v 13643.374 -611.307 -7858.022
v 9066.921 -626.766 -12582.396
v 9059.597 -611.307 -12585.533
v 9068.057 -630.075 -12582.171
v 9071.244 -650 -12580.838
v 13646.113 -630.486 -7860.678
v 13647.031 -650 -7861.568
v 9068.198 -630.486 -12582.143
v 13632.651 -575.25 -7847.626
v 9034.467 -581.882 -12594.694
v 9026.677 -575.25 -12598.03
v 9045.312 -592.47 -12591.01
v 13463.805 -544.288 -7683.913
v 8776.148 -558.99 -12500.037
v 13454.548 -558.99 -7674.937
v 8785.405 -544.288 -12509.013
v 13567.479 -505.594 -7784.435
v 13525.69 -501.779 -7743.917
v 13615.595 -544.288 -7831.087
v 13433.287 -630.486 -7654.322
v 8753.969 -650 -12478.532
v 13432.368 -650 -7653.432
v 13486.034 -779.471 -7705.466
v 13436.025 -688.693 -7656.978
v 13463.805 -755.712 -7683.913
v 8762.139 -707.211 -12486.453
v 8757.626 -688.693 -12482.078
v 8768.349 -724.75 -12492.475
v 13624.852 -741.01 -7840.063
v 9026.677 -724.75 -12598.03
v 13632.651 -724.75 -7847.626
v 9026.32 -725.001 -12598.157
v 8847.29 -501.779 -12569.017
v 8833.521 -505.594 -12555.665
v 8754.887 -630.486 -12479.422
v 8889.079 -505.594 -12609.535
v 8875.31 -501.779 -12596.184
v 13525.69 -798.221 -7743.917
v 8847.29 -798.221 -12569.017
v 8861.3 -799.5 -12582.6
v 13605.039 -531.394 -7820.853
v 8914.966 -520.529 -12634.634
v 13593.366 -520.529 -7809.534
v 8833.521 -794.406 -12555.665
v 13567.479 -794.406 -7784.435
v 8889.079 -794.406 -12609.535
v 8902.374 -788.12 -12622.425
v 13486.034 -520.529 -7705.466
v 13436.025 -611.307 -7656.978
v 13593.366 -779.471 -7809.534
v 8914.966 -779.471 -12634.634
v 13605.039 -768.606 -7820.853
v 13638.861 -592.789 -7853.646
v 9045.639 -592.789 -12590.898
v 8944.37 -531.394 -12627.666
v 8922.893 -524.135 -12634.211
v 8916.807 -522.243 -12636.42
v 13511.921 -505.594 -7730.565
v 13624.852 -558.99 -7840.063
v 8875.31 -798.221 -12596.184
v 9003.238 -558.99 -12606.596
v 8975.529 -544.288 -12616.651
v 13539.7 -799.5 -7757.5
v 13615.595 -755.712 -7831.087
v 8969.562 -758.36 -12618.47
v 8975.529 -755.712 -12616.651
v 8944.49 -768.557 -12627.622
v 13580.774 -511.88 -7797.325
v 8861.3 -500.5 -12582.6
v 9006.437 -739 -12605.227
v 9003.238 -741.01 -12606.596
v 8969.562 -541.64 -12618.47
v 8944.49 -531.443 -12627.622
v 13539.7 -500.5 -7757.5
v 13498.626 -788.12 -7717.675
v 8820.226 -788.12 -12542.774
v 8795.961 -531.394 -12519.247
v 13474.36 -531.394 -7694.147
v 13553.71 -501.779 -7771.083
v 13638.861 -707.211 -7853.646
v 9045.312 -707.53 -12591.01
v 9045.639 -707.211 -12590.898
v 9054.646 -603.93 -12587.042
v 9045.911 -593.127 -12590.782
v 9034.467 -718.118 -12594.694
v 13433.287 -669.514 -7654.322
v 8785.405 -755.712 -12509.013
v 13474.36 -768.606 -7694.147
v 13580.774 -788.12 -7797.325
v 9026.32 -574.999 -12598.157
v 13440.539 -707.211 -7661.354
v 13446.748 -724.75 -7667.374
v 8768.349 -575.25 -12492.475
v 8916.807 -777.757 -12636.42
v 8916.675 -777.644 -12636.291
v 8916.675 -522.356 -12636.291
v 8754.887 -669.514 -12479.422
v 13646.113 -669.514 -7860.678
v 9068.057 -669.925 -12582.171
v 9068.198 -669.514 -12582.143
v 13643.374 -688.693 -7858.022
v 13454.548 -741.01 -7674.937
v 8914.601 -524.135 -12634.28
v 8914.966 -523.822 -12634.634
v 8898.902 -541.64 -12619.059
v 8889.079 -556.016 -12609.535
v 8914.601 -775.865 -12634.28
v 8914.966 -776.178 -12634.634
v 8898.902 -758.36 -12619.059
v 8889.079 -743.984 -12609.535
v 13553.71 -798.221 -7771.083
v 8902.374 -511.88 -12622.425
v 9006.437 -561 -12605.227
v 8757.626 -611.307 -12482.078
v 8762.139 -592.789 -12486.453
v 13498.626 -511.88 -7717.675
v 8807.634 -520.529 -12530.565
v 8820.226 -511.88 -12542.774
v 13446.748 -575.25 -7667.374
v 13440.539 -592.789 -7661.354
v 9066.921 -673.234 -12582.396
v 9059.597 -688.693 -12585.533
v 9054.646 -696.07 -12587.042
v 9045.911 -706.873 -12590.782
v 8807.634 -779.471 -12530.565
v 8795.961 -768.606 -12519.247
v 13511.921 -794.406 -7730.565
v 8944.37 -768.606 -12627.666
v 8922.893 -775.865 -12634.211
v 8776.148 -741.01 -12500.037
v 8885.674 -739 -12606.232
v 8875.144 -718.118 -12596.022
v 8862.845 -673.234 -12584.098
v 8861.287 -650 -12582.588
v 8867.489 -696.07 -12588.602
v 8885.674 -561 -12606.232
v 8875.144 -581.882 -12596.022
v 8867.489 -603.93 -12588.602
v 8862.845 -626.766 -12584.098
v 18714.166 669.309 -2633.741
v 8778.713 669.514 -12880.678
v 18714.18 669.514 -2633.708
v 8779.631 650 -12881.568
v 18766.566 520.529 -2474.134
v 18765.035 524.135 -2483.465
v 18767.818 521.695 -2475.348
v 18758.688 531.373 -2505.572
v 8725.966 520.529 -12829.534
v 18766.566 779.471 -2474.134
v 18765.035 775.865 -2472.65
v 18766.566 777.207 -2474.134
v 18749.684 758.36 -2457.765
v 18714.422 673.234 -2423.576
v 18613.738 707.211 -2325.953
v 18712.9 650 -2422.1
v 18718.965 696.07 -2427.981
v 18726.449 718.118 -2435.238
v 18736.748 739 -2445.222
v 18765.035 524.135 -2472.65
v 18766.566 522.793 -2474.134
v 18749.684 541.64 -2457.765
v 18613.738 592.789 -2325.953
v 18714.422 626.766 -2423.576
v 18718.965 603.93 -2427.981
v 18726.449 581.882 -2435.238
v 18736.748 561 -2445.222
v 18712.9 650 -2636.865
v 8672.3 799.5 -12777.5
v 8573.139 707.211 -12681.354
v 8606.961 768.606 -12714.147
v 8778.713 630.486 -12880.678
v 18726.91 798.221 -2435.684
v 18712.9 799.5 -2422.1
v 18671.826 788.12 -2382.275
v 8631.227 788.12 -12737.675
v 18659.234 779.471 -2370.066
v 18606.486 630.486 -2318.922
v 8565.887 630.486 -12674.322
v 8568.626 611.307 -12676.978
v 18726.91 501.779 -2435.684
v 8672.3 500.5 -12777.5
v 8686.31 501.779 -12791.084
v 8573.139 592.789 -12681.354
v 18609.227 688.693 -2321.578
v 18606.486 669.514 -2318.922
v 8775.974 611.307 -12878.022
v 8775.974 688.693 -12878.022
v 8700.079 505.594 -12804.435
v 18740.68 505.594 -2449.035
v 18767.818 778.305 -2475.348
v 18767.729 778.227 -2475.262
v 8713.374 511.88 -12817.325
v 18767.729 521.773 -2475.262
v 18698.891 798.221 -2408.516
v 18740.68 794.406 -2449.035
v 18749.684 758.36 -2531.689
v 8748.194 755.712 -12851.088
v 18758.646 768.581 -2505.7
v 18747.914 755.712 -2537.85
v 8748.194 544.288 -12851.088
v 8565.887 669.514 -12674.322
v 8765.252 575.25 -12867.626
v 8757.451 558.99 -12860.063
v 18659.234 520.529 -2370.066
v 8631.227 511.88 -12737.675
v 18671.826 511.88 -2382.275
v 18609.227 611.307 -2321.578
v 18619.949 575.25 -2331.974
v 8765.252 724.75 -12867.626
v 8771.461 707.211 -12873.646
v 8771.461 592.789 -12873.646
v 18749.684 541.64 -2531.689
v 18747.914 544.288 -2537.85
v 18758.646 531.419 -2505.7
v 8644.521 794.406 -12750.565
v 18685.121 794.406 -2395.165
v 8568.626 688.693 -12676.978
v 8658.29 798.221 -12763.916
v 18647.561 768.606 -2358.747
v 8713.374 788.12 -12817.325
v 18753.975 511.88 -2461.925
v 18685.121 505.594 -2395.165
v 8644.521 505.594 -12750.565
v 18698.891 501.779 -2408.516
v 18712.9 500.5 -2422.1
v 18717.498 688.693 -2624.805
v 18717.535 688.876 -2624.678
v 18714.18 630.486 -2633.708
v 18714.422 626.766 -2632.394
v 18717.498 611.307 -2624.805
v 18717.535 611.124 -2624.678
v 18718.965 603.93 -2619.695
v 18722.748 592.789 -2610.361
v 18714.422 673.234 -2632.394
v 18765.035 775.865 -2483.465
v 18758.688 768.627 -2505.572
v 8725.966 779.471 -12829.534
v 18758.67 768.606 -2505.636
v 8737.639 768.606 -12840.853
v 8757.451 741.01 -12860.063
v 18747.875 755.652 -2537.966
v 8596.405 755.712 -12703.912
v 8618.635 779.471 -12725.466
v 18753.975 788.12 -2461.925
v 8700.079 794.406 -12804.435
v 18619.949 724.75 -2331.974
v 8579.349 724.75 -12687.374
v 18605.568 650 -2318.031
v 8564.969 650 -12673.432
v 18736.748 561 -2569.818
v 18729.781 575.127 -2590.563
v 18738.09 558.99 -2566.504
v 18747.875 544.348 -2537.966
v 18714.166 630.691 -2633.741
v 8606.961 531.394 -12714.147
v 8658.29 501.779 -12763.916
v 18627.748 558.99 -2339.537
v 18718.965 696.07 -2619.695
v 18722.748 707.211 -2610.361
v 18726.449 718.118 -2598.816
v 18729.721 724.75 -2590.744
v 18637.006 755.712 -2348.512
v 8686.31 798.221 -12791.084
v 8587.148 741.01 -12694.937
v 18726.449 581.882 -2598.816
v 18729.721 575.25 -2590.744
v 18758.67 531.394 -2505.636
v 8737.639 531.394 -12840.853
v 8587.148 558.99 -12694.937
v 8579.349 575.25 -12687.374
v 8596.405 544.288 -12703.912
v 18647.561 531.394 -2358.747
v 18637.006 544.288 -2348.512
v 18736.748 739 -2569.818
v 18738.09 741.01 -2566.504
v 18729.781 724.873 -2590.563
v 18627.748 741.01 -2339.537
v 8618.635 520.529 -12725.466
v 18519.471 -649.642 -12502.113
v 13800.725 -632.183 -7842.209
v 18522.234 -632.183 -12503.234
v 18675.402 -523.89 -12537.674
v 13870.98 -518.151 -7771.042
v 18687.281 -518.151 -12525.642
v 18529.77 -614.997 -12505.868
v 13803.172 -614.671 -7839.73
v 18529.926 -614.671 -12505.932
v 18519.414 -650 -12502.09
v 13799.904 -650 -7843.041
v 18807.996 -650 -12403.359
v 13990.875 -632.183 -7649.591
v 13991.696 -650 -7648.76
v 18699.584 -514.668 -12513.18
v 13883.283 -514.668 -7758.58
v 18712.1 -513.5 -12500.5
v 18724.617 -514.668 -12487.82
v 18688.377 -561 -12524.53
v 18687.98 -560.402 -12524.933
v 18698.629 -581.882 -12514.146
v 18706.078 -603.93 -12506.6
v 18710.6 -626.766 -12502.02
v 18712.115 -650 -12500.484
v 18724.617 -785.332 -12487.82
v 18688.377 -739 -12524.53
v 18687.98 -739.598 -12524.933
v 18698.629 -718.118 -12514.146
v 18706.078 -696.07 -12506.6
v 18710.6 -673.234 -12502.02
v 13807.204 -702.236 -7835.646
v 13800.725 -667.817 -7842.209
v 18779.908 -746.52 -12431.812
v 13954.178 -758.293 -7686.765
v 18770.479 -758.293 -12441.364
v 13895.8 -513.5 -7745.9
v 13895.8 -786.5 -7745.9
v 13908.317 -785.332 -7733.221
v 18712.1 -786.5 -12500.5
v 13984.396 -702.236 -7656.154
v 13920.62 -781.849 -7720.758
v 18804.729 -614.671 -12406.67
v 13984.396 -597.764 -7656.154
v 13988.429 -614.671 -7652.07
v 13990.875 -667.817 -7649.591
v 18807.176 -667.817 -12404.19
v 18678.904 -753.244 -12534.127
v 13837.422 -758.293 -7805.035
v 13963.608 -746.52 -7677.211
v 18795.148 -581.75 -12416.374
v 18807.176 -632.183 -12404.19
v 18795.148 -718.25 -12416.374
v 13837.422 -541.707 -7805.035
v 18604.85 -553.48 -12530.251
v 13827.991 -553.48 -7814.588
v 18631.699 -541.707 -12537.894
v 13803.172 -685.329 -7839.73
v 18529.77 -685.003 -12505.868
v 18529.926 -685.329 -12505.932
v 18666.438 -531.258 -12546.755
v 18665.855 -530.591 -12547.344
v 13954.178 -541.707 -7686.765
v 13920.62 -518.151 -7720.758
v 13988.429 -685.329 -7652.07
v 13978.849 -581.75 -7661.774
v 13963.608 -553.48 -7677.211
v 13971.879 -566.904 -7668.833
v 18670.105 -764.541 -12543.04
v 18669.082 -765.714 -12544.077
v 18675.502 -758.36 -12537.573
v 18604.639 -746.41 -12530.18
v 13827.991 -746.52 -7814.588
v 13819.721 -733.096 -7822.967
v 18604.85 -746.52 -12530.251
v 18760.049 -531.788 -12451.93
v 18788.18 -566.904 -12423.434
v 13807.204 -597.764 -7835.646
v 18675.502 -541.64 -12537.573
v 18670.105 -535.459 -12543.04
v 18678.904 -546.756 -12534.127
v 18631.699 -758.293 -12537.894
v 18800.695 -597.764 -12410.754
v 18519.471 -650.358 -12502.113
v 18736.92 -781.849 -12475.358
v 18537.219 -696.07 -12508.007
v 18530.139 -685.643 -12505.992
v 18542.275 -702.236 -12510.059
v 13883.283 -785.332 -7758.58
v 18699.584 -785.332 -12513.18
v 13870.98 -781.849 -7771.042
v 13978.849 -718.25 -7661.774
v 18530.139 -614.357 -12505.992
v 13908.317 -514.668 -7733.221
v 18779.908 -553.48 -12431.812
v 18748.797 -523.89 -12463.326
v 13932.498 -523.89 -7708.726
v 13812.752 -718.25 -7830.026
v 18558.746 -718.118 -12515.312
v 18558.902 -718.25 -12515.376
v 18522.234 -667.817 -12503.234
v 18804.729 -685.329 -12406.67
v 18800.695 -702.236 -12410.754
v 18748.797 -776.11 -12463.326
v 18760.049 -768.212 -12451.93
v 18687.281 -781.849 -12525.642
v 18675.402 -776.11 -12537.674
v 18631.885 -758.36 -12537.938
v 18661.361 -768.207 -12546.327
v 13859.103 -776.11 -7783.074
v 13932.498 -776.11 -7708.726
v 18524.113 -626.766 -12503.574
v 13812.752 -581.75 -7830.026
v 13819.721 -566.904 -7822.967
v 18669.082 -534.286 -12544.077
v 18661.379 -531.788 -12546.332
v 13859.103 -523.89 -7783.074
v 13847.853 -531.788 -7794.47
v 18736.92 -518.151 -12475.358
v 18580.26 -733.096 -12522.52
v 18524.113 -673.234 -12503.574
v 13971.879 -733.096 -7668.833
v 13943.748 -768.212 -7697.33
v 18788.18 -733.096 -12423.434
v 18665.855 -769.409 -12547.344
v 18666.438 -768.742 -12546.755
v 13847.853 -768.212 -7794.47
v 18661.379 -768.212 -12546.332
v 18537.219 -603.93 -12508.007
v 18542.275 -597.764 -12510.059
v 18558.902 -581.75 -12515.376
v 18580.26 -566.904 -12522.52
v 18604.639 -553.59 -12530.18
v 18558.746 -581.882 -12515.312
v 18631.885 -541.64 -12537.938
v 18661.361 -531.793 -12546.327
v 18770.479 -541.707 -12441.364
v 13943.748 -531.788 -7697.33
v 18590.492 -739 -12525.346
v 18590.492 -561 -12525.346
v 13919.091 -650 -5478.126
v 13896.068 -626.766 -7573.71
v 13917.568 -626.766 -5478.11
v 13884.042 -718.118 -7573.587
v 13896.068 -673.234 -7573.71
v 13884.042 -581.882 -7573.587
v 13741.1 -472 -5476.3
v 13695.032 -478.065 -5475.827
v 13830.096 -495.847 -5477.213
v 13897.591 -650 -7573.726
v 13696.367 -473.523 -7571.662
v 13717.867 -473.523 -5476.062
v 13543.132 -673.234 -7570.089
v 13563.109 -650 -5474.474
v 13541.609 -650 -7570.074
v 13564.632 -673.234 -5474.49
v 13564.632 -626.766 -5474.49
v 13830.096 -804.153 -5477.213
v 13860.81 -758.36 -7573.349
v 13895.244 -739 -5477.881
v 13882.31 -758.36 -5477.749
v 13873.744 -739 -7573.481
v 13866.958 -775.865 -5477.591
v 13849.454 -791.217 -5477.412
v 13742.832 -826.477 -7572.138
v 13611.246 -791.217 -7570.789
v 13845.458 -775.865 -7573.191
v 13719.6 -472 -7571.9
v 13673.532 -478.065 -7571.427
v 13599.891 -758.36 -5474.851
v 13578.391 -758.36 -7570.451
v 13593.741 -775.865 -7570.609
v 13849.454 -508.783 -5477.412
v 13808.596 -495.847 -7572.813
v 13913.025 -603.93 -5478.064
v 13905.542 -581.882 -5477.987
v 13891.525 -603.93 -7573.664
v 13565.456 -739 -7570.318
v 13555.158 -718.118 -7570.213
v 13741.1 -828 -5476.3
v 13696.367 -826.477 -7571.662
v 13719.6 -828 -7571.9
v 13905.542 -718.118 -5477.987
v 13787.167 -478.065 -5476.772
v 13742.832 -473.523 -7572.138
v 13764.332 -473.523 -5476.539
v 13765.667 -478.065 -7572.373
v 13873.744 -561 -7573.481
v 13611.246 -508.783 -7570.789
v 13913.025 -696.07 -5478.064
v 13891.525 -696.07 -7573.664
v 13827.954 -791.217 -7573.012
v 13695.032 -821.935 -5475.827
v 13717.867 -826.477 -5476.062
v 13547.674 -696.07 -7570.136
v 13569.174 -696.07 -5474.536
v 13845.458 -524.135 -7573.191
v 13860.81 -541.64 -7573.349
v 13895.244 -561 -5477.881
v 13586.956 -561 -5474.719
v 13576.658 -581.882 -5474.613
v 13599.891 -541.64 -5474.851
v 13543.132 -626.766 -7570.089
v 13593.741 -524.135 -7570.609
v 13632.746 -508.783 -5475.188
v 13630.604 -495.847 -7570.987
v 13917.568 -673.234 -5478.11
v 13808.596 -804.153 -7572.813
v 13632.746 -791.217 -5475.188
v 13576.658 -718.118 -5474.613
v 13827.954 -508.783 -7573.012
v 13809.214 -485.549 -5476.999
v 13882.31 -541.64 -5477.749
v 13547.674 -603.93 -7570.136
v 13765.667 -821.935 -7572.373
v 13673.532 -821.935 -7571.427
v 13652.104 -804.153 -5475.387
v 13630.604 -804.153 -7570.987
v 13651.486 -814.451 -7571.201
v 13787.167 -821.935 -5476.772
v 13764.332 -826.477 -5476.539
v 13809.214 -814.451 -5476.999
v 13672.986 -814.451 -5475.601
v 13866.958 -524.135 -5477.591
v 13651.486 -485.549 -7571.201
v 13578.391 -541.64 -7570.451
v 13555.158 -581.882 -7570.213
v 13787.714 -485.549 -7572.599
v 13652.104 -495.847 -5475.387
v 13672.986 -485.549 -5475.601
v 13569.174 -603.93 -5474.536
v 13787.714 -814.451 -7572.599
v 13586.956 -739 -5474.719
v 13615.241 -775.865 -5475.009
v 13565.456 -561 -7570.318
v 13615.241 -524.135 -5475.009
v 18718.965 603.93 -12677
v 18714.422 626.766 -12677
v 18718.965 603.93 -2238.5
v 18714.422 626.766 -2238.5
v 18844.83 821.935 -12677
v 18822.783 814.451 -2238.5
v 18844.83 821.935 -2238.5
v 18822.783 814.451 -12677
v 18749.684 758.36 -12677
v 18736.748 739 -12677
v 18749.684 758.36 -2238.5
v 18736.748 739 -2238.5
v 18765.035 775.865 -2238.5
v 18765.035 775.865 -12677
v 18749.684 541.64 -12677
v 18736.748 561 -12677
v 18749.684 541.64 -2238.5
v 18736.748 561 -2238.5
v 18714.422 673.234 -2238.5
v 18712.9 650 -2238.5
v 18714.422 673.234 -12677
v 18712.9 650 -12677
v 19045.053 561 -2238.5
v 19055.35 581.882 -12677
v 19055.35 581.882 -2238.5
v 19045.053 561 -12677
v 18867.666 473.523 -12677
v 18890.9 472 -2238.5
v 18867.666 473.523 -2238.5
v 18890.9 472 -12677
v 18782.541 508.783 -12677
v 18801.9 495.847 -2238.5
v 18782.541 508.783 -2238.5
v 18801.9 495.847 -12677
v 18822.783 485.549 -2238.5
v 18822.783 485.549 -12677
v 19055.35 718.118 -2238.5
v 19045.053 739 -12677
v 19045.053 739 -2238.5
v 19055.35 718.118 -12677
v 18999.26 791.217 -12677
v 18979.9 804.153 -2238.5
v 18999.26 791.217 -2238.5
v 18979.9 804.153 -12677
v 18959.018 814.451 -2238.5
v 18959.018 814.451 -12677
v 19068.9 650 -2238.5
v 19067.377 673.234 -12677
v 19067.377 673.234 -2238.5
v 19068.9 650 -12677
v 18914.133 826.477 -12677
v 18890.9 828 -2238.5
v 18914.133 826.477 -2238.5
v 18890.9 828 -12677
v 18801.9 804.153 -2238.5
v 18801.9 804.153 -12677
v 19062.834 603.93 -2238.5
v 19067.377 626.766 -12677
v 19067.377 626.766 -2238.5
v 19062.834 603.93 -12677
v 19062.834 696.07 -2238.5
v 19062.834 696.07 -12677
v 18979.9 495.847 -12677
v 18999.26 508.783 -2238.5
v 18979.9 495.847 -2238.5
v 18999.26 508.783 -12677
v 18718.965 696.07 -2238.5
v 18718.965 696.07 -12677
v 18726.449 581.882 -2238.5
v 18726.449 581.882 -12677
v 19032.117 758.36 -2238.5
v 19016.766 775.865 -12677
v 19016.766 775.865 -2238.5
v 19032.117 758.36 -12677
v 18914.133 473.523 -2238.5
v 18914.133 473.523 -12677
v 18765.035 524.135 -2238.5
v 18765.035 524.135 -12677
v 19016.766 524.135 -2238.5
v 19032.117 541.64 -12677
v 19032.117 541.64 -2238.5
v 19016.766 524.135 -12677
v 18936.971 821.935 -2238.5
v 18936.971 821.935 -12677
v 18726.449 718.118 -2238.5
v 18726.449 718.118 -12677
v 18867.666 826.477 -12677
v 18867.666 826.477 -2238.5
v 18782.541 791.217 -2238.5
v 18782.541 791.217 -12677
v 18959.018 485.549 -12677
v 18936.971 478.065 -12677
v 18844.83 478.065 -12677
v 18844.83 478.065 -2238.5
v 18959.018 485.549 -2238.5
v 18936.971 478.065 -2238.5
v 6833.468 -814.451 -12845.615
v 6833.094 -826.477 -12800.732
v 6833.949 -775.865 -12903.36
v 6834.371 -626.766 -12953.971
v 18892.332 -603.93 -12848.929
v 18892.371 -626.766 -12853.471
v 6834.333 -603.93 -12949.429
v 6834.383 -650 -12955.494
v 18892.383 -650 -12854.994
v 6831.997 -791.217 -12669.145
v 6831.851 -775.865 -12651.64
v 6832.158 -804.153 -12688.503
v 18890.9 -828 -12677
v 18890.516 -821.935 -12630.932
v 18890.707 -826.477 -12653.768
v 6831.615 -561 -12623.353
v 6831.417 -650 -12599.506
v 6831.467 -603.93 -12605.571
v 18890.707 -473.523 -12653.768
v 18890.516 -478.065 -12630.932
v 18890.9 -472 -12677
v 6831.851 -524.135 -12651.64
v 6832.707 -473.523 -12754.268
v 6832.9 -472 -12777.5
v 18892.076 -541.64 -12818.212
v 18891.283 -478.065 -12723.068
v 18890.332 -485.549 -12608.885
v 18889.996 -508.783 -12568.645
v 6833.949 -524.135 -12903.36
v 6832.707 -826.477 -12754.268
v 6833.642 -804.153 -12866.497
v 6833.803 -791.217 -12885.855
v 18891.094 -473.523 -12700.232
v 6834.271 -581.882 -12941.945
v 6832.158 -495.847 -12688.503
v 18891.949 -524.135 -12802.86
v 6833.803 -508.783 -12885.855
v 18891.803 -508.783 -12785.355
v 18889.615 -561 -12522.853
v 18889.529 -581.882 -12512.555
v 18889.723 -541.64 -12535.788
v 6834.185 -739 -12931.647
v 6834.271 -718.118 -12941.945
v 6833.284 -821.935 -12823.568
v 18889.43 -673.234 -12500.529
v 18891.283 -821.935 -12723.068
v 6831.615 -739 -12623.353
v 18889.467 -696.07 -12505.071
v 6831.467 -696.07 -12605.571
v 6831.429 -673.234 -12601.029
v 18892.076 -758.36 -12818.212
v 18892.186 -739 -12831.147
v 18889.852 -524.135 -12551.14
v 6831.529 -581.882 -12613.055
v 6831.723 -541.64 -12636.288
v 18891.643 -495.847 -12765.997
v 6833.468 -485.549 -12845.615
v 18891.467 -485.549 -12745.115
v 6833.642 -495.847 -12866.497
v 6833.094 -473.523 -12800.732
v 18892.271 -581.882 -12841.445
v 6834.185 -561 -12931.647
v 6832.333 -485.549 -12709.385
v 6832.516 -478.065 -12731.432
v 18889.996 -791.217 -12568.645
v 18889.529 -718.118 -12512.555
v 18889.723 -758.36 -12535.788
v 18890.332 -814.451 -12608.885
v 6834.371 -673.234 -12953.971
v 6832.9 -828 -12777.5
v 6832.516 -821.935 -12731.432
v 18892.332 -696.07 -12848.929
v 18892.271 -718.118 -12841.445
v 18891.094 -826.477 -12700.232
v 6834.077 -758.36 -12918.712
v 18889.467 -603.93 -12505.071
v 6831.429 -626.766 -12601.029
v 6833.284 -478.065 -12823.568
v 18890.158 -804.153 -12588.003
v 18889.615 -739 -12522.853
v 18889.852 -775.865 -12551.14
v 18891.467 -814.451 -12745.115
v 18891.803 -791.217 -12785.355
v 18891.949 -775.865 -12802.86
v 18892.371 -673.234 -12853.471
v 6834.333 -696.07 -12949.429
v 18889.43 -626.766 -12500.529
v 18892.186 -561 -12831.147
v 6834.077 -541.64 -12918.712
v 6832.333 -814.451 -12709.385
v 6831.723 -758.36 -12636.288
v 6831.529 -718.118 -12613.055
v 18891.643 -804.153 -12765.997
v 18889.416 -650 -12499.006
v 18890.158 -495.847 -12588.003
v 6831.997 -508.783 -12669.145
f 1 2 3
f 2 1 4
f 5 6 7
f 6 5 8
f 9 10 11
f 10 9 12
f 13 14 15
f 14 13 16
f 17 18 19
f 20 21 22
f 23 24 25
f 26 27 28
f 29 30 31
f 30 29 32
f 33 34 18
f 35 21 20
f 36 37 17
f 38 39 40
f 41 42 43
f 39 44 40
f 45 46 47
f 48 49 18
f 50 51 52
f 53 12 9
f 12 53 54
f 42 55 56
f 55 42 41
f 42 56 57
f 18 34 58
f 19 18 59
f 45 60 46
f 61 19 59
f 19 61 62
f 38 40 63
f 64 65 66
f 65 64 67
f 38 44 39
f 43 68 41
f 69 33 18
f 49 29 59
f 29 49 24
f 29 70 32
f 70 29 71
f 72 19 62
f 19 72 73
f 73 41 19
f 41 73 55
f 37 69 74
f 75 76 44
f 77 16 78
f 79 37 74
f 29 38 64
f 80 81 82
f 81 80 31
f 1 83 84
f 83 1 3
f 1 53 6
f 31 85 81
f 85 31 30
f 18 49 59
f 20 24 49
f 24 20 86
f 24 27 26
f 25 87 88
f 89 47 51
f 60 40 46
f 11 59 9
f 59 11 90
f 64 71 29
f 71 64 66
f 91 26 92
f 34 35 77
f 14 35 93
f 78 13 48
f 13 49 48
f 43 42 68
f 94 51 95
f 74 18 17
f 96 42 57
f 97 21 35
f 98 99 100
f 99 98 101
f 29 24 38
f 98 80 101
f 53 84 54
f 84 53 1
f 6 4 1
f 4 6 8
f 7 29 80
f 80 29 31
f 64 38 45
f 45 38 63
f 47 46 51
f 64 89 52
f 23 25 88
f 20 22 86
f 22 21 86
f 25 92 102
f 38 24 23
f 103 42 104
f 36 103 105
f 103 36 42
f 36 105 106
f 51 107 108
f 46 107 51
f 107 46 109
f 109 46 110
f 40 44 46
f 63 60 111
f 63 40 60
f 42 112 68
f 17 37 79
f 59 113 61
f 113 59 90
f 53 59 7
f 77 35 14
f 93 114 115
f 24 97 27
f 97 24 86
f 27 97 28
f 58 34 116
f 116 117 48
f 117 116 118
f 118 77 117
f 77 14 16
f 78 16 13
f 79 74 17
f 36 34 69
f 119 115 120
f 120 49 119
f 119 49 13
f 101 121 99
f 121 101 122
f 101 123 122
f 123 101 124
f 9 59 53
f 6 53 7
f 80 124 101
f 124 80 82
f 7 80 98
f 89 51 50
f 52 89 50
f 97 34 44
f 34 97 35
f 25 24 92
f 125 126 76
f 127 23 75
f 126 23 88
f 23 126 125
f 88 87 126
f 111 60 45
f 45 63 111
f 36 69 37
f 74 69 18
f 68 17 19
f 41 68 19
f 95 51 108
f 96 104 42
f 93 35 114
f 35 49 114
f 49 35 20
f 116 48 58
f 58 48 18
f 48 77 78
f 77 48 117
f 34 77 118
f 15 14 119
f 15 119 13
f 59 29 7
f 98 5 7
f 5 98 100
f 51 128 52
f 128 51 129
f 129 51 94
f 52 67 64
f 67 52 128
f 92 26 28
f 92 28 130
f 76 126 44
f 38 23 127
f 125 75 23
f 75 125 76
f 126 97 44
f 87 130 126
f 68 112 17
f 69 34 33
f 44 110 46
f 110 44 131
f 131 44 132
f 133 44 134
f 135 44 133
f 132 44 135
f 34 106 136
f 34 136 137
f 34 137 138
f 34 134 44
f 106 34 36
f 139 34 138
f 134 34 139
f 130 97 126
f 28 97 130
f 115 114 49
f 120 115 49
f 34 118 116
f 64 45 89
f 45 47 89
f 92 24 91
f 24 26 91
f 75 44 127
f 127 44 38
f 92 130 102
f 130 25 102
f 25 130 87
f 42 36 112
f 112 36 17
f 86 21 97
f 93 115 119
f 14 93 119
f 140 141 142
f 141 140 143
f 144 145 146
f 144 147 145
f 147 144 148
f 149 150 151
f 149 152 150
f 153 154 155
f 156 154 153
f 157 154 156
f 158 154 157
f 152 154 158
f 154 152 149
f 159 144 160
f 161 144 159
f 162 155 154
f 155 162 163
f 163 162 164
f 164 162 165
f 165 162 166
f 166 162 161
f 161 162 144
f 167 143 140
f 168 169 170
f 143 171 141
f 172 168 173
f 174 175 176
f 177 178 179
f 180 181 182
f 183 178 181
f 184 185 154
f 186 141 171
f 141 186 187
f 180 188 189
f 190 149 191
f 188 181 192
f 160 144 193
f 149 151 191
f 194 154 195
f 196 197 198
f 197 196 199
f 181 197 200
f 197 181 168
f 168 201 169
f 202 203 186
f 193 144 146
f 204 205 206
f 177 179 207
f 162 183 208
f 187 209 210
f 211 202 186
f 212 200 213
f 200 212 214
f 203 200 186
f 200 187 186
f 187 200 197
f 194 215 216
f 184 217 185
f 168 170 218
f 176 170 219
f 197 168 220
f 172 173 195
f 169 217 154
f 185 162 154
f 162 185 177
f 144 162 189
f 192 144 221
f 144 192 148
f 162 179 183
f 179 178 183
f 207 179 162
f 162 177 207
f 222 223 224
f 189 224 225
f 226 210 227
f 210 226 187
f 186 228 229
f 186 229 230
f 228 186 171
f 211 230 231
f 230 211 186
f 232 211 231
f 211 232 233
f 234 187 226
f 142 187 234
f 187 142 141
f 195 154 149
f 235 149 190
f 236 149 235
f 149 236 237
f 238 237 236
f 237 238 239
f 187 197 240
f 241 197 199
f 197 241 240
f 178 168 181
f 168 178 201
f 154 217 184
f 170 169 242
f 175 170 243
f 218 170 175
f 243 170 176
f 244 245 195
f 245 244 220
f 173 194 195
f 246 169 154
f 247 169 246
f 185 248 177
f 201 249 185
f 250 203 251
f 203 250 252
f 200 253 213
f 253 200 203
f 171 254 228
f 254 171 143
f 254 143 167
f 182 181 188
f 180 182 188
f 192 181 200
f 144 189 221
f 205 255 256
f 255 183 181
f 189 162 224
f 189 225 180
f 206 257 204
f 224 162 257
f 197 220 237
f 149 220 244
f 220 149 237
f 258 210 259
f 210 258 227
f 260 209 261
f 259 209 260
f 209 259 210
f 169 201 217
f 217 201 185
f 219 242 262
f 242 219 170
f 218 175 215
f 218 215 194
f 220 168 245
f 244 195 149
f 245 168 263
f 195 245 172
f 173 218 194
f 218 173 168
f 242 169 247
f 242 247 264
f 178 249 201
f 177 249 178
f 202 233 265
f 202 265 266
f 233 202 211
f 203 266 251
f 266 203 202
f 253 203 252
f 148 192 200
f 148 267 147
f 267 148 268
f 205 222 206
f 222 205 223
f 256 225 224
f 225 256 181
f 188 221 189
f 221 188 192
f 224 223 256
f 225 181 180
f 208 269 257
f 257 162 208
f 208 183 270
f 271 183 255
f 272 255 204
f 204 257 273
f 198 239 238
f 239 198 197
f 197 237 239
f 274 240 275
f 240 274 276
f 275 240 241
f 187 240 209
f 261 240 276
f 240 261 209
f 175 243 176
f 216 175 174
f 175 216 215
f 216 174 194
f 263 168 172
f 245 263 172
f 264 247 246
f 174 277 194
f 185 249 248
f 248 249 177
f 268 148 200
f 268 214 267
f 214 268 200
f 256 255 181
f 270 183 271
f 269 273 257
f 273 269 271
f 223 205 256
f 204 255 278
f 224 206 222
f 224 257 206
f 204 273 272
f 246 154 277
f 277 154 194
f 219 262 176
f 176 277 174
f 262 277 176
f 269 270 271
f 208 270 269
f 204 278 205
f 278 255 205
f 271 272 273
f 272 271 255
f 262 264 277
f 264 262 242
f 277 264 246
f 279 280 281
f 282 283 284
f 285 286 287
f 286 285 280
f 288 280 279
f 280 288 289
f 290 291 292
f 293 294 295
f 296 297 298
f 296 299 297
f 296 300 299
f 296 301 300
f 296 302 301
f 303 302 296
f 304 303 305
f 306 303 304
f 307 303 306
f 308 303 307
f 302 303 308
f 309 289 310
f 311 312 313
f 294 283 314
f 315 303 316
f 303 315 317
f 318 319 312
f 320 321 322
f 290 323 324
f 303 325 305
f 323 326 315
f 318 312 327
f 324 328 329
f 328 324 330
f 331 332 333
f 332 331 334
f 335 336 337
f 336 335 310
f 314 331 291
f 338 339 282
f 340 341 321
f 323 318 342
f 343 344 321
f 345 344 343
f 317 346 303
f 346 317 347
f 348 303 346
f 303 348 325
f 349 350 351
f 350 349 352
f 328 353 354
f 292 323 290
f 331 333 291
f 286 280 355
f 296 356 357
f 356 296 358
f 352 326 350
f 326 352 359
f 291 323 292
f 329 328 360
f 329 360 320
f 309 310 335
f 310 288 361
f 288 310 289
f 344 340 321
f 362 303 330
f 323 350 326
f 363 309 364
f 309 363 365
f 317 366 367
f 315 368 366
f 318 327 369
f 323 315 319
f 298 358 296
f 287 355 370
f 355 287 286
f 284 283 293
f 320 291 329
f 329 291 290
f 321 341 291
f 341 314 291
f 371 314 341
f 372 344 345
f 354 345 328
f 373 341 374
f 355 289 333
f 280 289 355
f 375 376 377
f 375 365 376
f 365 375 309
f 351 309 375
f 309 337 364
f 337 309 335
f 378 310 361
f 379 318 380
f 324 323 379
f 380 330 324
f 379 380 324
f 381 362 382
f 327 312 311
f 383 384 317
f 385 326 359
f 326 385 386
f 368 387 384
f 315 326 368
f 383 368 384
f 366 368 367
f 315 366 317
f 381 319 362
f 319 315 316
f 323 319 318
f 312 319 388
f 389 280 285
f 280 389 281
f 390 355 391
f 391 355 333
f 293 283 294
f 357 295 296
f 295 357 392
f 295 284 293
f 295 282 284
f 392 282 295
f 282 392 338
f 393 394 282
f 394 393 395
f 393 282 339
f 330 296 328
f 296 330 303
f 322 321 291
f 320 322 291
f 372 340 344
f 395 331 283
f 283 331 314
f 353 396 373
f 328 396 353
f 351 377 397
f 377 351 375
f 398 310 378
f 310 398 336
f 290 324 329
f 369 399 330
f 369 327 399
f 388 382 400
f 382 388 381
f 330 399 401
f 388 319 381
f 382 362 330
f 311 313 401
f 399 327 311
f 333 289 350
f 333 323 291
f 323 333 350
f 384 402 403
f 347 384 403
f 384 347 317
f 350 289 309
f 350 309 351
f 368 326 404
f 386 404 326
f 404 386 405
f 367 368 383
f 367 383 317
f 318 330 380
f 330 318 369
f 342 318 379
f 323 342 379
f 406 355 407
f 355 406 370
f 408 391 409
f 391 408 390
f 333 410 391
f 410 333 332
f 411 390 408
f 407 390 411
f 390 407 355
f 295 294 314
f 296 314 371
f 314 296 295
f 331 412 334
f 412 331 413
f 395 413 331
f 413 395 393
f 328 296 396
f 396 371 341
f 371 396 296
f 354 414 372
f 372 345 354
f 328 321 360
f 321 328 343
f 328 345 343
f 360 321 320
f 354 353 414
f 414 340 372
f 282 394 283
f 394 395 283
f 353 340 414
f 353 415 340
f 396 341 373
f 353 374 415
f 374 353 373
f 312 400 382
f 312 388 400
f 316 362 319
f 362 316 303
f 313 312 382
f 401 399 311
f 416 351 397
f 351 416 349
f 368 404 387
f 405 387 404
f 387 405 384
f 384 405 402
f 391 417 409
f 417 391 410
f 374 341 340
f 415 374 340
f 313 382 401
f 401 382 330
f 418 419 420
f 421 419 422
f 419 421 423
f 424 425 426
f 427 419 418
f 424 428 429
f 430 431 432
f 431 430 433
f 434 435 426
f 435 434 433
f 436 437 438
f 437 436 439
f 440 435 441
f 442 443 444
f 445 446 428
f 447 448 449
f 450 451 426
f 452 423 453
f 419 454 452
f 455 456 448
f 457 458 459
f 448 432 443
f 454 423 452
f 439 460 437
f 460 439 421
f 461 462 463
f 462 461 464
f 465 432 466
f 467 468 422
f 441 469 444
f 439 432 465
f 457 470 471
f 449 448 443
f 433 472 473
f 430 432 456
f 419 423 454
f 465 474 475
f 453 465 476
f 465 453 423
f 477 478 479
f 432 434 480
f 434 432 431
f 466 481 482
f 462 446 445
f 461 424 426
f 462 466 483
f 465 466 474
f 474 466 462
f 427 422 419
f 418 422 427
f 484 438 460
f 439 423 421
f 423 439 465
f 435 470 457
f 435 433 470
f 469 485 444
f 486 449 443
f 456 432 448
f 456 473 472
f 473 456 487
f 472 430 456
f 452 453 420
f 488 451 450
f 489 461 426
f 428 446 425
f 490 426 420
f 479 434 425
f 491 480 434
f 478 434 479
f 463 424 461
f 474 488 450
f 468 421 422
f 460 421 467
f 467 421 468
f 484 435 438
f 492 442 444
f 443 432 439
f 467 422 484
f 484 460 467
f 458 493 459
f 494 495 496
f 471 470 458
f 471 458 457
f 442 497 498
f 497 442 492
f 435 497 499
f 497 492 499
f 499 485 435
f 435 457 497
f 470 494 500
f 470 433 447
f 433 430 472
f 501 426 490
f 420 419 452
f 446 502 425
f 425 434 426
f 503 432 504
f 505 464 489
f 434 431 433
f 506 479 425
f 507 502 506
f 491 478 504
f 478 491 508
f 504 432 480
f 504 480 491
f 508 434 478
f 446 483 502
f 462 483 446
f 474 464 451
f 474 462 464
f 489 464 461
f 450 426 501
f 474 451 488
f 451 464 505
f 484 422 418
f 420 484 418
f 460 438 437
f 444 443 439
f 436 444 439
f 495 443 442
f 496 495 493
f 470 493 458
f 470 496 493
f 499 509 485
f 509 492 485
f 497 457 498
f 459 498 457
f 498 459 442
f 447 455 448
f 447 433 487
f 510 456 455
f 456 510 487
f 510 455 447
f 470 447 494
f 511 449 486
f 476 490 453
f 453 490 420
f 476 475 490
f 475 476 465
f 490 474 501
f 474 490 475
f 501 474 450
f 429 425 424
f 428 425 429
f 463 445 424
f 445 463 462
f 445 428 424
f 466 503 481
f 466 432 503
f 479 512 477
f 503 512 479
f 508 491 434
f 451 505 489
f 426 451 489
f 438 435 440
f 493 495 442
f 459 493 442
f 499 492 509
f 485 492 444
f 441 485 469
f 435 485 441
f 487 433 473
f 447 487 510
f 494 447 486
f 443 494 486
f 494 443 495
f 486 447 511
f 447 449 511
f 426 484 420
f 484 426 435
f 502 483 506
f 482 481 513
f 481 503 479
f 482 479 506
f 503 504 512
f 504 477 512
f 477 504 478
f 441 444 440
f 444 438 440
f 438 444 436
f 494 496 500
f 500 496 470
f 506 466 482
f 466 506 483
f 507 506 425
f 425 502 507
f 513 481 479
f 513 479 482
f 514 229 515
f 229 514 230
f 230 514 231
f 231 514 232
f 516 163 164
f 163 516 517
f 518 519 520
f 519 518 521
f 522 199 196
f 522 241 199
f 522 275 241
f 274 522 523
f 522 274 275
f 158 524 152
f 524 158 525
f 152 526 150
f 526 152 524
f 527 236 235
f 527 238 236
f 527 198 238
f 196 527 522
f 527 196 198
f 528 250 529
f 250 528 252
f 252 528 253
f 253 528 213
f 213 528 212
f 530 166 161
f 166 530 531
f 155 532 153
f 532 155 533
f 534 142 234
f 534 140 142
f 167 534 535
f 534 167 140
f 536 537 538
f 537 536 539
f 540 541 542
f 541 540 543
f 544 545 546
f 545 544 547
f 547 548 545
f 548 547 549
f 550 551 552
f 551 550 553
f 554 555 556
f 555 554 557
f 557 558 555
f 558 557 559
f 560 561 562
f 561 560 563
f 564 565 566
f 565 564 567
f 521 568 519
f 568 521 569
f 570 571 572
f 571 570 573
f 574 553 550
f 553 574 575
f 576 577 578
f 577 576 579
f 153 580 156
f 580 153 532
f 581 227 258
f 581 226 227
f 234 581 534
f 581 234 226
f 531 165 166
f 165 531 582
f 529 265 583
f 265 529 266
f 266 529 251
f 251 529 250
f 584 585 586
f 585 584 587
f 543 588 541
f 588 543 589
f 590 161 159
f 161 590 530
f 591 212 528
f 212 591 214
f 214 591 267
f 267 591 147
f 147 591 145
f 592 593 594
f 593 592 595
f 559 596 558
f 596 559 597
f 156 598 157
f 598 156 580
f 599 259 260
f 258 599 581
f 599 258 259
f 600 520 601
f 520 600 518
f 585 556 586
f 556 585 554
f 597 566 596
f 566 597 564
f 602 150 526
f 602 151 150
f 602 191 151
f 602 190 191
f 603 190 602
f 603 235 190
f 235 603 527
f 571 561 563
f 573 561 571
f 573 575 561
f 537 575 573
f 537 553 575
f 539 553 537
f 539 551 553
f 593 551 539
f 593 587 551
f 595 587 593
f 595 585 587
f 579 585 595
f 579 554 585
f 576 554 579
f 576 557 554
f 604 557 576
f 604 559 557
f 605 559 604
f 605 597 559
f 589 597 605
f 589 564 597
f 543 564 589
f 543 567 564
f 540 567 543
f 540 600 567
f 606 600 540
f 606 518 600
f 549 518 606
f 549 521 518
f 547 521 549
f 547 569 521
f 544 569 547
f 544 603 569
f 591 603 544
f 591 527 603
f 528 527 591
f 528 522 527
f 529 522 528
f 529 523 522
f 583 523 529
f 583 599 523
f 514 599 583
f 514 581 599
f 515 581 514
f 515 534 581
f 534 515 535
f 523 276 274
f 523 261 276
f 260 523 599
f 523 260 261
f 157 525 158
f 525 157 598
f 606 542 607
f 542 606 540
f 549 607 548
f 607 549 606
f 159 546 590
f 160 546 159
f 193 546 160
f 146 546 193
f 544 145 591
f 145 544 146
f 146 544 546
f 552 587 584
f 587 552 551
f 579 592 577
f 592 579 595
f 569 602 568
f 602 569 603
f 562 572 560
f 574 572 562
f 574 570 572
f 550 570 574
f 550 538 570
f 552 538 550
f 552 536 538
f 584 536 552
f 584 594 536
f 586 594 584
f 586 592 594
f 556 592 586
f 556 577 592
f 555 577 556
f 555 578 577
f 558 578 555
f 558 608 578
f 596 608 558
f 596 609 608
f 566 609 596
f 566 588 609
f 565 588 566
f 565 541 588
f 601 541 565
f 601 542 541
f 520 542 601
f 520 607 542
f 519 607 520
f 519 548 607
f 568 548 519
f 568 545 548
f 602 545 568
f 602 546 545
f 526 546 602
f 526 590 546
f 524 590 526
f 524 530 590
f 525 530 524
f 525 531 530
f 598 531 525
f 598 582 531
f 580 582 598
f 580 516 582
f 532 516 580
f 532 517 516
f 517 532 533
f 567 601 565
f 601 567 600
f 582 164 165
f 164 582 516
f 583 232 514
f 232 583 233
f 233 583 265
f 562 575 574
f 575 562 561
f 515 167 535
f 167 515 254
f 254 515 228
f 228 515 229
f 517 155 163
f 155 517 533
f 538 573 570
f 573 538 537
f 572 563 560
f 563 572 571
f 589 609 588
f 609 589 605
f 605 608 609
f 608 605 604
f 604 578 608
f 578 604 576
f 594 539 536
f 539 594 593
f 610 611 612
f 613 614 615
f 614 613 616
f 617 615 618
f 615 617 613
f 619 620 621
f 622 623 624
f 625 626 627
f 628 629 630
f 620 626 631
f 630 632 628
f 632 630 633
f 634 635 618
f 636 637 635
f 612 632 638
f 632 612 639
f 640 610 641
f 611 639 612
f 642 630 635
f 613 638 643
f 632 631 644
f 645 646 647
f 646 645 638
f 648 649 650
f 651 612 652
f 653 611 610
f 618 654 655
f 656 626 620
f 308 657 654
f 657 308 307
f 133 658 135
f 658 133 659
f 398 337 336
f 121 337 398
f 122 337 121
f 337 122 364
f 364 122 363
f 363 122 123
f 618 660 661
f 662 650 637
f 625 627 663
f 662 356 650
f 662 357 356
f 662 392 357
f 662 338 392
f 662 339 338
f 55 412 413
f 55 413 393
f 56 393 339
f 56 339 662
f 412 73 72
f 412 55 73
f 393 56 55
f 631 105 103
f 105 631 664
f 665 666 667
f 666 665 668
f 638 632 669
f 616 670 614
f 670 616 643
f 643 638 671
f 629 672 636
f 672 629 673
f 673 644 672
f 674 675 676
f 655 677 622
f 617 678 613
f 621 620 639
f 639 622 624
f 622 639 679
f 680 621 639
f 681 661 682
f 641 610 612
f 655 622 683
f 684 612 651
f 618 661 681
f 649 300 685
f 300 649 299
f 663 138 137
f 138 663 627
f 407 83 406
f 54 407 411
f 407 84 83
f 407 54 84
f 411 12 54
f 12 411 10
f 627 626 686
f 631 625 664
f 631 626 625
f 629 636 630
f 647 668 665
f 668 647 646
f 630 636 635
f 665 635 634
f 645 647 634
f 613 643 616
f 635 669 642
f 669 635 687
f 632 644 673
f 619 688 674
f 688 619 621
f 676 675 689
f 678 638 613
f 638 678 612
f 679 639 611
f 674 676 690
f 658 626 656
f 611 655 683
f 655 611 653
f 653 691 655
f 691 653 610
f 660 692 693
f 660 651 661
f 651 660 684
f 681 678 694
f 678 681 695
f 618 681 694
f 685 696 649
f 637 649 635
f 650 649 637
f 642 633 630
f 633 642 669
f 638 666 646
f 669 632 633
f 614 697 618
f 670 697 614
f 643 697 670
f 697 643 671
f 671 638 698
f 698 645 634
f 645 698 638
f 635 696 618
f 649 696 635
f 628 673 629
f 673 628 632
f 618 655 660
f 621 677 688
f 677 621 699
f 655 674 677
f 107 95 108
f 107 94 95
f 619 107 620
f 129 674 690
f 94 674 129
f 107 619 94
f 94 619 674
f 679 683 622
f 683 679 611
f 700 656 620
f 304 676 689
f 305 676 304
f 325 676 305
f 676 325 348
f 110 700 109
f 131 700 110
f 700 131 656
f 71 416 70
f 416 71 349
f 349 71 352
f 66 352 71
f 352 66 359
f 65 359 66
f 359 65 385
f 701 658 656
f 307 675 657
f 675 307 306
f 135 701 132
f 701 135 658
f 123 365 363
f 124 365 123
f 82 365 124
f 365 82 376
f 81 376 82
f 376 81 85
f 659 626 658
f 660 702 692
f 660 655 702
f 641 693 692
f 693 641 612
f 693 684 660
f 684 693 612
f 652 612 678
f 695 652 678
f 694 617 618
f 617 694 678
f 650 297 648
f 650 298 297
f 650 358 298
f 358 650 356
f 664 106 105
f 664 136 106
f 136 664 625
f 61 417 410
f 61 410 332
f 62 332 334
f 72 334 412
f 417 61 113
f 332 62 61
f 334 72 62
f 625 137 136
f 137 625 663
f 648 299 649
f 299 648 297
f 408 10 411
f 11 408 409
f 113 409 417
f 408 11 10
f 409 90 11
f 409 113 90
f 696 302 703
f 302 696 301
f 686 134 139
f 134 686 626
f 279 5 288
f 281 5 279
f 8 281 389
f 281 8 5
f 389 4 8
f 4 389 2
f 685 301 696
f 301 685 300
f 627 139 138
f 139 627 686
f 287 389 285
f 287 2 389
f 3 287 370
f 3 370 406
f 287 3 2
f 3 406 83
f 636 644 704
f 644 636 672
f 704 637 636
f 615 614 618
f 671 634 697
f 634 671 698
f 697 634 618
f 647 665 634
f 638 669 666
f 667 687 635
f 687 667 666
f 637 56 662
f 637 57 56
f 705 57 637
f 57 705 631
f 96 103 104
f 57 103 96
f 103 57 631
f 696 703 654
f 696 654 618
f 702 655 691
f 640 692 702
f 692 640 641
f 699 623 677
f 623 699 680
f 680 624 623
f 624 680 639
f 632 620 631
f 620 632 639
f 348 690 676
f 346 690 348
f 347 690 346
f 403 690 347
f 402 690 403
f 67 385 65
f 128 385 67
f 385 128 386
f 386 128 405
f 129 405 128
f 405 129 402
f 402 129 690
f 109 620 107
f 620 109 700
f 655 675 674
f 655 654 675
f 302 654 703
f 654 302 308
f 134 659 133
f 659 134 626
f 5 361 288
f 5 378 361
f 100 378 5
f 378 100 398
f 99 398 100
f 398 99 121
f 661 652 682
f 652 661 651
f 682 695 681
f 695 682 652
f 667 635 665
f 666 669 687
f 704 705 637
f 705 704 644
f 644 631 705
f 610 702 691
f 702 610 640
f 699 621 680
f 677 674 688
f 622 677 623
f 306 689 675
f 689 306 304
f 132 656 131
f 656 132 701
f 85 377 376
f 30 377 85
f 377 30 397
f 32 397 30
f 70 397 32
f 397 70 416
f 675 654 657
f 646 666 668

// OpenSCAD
// SZK31102A 铁塔 050 横担部段 X节点群 — 由 PDF 图纸自动重建 (demo)
// 比例: 1:1 (mm), 由 表长11847mm <-> 矢量提取1179pt 标定
// 坐标系: X=图面横向, Y=图面深度(前片为+), Z=高度(上为正)
// 件号与明细表对应关系见各行注释; 杆端已按主管表面相贯修剪
$fn = 48;

module tube(p1, p2, r, col) {
  v = p2 - p1;
  L = norm(v);
  ax = cross([0,0,1], v);
  translate(p1) color(col)
    if (norm(ax) < 1e-9)
      rotate([0, v[2] > 0 ? 0 : 180, 0]) cylinder(h = L, r = r);
    else
      rotate(a = acos(min(1, max(-1, v[2]/L))), v = ax) cylinder(h = L, r = r);
}

// 件号 2606  Q355φ299X6  表长 8785mm  模型段长 6721mm  斜材X·左臂(前片)  相贯修剪于 2607,2601
tube([8861.3, -650.0, -12582.6], [13539.7, -650.0, -7757.5], 149.5, "DarkOrange");

// 件号 2605  Q355φ299X6  表长 10185mm  模型段长 14424mm  斜材X·长臂(后片)  相贯修剪于 2608
tube([8672.3, 650.0, -12777.5], [18712.9, 650.0, -2422.1], 149.5, "DarkOrange");

// 件号 2609  Q355φ273X5  表长 9234mm  模型段长 6768mm  斜材X·右臂(前片)  相贯修剪于 2607,2601
tube([13895.8, -650.0, -7745.9], [18712.1, -650.0, -12500.5], 136.5, "DarkOrange");

// 件号 2607  Q355φ356X7  表长 1927mm  模型段长 2096mm  横担前弦杆(向上延续)  无修剪
tube([13719.6, -650.0, -7571.9], [13741.1, -650.0, -5476.3], 178.0, "ForestGreen");

// 件号 2608  Q355φ356X7  表长 11400mm  模型段长 10438mm  横担后弦柱(右端)  无修剪
tube([18890.9, 650.0, -2238.5], [18890.9, 650.0, -12677.0], 178.0, "ForestGreen");

// 件号 2601  Q355φ356X7  表长 11847mm  模型段长 12058mm  底部弦杆 L=11847  无修剪
tube([6832.9, -650.0, -12777.5], [18890.9, -650.0, -12677.0], 178.0, "SteelBlue");
